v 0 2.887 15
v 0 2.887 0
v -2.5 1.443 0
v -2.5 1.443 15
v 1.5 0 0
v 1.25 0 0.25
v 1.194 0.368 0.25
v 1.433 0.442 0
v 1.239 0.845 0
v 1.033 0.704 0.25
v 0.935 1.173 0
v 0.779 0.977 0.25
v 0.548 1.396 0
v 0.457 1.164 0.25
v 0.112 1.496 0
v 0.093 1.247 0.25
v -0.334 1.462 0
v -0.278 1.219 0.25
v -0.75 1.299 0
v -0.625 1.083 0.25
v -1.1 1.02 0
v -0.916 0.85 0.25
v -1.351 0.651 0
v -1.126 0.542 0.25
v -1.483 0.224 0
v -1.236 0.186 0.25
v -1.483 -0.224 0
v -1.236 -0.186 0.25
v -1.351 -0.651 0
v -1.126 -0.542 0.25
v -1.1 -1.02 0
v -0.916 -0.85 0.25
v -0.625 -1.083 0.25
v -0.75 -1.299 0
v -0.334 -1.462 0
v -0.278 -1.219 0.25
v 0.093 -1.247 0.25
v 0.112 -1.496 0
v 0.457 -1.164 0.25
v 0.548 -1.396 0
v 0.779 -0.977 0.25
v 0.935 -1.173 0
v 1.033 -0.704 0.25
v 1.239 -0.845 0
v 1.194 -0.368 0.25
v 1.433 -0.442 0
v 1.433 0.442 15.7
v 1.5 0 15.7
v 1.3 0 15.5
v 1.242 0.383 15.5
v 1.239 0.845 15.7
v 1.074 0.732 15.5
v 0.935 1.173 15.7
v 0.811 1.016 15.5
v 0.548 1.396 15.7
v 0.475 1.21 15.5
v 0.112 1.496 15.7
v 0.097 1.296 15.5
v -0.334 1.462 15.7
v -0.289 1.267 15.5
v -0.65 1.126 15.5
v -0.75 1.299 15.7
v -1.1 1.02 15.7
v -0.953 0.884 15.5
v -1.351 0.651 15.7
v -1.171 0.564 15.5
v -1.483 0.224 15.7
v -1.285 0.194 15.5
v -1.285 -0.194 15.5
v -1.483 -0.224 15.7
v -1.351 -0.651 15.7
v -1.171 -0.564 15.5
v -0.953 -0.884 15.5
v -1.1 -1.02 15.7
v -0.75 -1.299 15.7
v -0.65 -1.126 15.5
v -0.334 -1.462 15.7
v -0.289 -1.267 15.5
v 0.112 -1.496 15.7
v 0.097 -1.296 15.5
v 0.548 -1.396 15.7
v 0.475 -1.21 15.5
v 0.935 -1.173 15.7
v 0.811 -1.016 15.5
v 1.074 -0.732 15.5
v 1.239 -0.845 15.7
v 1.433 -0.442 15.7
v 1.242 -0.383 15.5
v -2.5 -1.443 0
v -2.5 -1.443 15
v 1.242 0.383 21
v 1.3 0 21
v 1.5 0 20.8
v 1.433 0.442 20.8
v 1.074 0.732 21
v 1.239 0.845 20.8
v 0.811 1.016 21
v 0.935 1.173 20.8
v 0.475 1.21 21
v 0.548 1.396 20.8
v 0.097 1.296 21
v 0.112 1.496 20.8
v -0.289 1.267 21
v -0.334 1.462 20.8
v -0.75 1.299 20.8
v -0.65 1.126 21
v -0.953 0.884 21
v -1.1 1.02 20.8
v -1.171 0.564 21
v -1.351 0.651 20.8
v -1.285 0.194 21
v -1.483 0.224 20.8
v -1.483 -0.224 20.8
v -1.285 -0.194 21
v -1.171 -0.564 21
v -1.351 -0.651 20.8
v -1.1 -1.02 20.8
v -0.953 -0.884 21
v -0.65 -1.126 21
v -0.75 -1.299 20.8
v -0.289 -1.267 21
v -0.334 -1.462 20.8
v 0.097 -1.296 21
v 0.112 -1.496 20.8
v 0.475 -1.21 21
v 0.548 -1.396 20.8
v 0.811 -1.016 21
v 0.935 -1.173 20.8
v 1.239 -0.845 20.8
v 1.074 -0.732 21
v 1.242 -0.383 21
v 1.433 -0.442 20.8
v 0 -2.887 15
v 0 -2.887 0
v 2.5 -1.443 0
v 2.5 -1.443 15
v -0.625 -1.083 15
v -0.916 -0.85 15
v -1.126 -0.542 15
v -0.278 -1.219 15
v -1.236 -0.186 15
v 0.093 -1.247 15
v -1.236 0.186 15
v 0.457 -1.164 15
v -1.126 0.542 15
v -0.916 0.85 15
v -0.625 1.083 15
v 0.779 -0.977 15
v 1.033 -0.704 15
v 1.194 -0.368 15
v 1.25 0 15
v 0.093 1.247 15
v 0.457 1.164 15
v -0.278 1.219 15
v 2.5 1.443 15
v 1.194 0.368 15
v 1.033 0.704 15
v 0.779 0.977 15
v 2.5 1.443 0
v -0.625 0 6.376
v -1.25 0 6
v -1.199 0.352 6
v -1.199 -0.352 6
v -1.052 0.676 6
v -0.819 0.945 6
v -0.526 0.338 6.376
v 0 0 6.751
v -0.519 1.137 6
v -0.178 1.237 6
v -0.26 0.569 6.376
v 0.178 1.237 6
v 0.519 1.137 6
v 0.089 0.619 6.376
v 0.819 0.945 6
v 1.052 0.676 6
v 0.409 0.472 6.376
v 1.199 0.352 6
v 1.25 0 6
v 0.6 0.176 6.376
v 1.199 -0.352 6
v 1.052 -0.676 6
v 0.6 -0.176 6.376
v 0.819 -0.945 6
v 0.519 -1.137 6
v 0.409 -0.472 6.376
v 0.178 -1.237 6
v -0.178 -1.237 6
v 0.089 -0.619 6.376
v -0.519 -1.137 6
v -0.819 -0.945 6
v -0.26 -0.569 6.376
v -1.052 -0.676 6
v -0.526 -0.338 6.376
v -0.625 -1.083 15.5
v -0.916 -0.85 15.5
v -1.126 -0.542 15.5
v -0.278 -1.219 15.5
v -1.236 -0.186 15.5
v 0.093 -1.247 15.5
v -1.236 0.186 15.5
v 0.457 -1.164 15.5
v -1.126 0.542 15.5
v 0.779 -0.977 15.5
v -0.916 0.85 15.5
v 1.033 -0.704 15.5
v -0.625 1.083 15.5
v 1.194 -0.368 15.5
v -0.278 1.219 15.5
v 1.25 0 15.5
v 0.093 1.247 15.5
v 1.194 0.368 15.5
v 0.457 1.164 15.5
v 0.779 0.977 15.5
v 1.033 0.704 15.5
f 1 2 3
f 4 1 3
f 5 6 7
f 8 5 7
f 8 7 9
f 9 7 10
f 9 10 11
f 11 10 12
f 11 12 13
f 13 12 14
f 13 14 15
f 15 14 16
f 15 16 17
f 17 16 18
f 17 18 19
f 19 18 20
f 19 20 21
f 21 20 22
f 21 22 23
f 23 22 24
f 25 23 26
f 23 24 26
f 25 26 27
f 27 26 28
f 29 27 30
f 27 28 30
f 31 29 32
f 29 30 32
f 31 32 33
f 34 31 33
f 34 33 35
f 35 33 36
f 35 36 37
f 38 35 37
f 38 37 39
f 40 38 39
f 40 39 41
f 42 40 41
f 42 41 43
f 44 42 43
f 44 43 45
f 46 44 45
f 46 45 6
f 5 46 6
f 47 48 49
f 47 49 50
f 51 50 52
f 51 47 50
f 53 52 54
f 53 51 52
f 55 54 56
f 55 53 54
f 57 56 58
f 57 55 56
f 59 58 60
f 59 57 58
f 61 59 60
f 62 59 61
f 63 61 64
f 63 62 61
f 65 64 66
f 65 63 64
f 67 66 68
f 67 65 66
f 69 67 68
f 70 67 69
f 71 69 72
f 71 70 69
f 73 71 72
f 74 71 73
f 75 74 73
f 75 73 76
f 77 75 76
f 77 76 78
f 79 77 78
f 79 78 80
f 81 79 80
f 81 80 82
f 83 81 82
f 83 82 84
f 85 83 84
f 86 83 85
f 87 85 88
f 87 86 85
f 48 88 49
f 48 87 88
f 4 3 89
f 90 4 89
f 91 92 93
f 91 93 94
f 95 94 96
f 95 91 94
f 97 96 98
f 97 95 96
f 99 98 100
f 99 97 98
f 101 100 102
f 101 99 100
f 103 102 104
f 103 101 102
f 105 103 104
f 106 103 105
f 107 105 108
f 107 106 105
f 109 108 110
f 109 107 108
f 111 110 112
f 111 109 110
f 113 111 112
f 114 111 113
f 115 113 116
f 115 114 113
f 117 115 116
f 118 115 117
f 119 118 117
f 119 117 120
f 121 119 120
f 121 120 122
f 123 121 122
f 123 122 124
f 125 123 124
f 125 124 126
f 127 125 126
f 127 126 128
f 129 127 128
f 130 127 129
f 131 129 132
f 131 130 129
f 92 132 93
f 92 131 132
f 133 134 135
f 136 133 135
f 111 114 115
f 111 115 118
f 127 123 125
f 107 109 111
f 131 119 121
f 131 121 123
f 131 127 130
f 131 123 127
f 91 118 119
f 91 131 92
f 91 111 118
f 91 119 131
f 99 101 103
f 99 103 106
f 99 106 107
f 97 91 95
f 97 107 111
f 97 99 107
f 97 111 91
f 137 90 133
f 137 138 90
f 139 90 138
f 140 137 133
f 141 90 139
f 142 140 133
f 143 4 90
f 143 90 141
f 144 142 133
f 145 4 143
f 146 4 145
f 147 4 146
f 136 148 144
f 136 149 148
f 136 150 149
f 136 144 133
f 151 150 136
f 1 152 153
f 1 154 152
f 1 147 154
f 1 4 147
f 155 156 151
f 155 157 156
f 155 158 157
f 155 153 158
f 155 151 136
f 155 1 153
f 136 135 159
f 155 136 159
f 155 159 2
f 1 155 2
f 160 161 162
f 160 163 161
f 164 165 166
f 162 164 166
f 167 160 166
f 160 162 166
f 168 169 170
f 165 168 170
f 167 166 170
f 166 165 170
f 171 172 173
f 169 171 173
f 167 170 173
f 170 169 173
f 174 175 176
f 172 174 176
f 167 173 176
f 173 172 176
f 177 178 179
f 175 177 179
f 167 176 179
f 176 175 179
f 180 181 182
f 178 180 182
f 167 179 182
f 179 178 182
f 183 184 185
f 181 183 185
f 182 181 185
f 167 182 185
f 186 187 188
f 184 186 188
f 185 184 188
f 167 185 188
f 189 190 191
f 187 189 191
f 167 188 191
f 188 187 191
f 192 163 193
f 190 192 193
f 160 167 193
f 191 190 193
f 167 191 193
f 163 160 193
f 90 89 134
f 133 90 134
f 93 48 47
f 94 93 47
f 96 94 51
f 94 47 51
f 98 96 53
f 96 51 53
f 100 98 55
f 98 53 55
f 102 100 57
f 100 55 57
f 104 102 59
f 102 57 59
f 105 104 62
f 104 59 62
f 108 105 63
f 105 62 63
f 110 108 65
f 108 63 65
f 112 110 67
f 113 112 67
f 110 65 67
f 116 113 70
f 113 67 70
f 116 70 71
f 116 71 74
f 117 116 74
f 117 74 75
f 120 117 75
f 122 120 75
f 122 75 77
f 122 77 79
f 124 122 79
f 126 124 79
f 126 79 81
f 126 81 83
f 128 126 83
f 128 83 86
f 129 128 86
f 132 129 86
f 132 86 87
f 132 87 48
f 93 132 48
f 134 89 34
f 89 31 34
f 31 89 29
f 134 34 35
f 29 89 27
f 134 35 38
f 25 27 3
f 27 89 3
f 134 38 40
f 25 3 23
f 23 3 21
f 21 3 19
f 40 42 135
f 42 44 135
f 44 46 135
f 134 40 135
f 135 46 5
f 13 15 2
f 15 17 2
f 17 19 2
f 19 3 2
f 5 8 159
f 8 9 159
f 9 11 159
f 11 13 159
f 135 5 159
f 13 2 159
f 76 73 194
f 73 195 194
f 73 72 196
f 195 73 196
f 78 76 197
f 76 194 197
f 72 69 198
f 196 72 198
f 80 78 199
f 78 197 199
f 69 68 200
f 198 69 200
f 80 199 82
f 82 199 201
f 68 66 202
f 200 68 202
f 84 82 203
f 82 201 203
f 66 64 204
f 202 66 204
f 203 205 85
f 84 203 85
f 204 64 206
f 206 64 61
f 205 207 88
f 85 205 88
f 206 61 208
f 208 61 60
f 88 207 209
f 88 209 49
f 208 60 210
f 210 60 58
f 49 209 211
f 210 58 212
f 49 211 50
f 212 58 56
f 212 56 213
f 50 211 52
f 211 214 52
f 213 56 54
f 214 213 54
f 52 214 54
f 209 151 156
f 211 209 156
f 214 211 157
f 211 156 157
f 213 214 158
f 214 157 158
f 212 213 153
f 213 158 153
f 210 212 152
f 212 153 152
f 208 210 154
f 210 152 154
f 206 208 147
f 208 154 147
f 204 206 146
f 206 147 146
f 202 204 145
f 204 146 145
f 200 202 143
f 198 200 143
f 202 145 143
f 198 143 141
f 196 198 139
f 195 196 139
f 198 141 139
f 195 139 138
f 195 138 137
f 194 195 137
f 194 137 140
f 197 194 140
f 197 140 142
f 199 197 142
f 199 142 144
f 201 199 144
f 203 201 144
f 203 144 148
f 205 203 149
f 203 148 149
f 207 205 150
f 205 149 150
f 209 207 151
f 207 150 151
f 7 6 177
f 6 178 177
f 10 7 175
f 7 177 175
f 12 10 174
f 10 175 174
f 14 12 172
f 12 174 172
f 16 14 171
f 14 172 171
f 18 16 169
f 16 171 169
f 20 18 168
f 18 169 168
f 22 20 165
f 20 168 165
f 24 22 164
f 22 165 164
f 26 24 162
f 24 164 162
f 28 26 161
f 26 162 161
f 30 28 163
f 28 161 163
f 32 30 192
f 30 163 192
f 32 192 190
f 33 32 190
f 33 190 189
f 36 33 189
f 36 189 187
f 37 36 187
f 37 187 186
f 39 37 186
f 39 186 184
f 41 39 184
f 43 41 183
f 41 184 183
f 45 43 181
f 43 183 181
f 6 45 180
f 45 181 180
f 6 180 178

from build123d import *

# Parameters (mm, degrees)
EXTRUDE_1_DEPTH                = 15
SKETCH_2_R                     = 1.5
EXTRUDE_2_DEPTH                = 6
SKETCH_3_R                     = 1.5
SKETCH_3_R_2                   = 1.25
CUT_EXTRUDE_3_DEPTH            = 0.5
CHAMFER_1_SIZE                 = 0.2
M4_CLEARANCE_HOLE1_D           = 2.5
M4_CLEARANCE_HOLE1_DEPTH       = 6
M4_CLEARANCE_HOLE1_CSINK_D     = 3
M4_CLEARANCE_HOLE1_CSINK_ANGLE = 90
M4_CLEARANCE_HOLE1_TIP         = 0.751075774


with BuildPart() as part:
    # Эскиз1 → Вытянуть1 (new body)
    with BuildSketch(Plane.XY):
        Polygon((0, 2.886751346), (-2.5, 1.443375673), (-2.5, -1.443375673), (0, -2.886751346), (2.5, -1.443375673), (2.5, 1.443375673), align=None)
    extrude(amount=EXTRUDE_1_DEPTH)

    # Эскиз2 → Вытянуть2 (add)
    with BuildSketch(Plane.XY.offset(15)):
        Circle(SKETCH_2_R)
    extrude(amount=EXTRUDE_2_DEPTH)

    # Эскиз3 → Вырез-Вытянуть3 (cut)
    with BuildSketch(Plane.XY.offset(15)):
        Circle(SKETCH_3_R)
        Circle(SKETCH_3_R_2, mode=Mode.SUBTRACT)
    extrude(amount=CUT_EXTRUDE_3_DEPTH, mode=Mode.SUBTRACT)

    # Фаска1
    chamfer_1_edges = [part.edges().sort_by_distance(p)[0] for p in [
        (-1.5, 0, 21),
        (-1.5, 0, 15.5),
    ]]
    chamfer(chamfer_1_edges, length=CHAMFER_1_SIZE)

    # M4 Clearance Hole1
    with Locations(Plane(origin=(0, 0, 0), x_dir=(-1, 0, 0), z_dir=(0, 0, -1))):
        with Locations((0, 0)):
            CounterSinkHole(M4_CLEARANCE_HOLE1_D / 2, M4_CLEARANCE_HOLE1_CSINK_D / 2, depth=M4_CLEARANCE_HOLE1_DEPTH, counter_sink_angle=M4_CLEARANCE_HOLE1_CSINK_ANGLE)
            with Locations((0, 0, -(M4_CLEARANCE_HOLE1_DEPTH + M4_CLEARANCE_HOLE1_TIP / 2))):  # 118° drill point
                Cone(0, M4_CLEARANCE_HOLE1_D / 2, M4_CLEARANCE_HOLE1_TIP, mode=Mode.SUBTRACT)


solid = part.part
